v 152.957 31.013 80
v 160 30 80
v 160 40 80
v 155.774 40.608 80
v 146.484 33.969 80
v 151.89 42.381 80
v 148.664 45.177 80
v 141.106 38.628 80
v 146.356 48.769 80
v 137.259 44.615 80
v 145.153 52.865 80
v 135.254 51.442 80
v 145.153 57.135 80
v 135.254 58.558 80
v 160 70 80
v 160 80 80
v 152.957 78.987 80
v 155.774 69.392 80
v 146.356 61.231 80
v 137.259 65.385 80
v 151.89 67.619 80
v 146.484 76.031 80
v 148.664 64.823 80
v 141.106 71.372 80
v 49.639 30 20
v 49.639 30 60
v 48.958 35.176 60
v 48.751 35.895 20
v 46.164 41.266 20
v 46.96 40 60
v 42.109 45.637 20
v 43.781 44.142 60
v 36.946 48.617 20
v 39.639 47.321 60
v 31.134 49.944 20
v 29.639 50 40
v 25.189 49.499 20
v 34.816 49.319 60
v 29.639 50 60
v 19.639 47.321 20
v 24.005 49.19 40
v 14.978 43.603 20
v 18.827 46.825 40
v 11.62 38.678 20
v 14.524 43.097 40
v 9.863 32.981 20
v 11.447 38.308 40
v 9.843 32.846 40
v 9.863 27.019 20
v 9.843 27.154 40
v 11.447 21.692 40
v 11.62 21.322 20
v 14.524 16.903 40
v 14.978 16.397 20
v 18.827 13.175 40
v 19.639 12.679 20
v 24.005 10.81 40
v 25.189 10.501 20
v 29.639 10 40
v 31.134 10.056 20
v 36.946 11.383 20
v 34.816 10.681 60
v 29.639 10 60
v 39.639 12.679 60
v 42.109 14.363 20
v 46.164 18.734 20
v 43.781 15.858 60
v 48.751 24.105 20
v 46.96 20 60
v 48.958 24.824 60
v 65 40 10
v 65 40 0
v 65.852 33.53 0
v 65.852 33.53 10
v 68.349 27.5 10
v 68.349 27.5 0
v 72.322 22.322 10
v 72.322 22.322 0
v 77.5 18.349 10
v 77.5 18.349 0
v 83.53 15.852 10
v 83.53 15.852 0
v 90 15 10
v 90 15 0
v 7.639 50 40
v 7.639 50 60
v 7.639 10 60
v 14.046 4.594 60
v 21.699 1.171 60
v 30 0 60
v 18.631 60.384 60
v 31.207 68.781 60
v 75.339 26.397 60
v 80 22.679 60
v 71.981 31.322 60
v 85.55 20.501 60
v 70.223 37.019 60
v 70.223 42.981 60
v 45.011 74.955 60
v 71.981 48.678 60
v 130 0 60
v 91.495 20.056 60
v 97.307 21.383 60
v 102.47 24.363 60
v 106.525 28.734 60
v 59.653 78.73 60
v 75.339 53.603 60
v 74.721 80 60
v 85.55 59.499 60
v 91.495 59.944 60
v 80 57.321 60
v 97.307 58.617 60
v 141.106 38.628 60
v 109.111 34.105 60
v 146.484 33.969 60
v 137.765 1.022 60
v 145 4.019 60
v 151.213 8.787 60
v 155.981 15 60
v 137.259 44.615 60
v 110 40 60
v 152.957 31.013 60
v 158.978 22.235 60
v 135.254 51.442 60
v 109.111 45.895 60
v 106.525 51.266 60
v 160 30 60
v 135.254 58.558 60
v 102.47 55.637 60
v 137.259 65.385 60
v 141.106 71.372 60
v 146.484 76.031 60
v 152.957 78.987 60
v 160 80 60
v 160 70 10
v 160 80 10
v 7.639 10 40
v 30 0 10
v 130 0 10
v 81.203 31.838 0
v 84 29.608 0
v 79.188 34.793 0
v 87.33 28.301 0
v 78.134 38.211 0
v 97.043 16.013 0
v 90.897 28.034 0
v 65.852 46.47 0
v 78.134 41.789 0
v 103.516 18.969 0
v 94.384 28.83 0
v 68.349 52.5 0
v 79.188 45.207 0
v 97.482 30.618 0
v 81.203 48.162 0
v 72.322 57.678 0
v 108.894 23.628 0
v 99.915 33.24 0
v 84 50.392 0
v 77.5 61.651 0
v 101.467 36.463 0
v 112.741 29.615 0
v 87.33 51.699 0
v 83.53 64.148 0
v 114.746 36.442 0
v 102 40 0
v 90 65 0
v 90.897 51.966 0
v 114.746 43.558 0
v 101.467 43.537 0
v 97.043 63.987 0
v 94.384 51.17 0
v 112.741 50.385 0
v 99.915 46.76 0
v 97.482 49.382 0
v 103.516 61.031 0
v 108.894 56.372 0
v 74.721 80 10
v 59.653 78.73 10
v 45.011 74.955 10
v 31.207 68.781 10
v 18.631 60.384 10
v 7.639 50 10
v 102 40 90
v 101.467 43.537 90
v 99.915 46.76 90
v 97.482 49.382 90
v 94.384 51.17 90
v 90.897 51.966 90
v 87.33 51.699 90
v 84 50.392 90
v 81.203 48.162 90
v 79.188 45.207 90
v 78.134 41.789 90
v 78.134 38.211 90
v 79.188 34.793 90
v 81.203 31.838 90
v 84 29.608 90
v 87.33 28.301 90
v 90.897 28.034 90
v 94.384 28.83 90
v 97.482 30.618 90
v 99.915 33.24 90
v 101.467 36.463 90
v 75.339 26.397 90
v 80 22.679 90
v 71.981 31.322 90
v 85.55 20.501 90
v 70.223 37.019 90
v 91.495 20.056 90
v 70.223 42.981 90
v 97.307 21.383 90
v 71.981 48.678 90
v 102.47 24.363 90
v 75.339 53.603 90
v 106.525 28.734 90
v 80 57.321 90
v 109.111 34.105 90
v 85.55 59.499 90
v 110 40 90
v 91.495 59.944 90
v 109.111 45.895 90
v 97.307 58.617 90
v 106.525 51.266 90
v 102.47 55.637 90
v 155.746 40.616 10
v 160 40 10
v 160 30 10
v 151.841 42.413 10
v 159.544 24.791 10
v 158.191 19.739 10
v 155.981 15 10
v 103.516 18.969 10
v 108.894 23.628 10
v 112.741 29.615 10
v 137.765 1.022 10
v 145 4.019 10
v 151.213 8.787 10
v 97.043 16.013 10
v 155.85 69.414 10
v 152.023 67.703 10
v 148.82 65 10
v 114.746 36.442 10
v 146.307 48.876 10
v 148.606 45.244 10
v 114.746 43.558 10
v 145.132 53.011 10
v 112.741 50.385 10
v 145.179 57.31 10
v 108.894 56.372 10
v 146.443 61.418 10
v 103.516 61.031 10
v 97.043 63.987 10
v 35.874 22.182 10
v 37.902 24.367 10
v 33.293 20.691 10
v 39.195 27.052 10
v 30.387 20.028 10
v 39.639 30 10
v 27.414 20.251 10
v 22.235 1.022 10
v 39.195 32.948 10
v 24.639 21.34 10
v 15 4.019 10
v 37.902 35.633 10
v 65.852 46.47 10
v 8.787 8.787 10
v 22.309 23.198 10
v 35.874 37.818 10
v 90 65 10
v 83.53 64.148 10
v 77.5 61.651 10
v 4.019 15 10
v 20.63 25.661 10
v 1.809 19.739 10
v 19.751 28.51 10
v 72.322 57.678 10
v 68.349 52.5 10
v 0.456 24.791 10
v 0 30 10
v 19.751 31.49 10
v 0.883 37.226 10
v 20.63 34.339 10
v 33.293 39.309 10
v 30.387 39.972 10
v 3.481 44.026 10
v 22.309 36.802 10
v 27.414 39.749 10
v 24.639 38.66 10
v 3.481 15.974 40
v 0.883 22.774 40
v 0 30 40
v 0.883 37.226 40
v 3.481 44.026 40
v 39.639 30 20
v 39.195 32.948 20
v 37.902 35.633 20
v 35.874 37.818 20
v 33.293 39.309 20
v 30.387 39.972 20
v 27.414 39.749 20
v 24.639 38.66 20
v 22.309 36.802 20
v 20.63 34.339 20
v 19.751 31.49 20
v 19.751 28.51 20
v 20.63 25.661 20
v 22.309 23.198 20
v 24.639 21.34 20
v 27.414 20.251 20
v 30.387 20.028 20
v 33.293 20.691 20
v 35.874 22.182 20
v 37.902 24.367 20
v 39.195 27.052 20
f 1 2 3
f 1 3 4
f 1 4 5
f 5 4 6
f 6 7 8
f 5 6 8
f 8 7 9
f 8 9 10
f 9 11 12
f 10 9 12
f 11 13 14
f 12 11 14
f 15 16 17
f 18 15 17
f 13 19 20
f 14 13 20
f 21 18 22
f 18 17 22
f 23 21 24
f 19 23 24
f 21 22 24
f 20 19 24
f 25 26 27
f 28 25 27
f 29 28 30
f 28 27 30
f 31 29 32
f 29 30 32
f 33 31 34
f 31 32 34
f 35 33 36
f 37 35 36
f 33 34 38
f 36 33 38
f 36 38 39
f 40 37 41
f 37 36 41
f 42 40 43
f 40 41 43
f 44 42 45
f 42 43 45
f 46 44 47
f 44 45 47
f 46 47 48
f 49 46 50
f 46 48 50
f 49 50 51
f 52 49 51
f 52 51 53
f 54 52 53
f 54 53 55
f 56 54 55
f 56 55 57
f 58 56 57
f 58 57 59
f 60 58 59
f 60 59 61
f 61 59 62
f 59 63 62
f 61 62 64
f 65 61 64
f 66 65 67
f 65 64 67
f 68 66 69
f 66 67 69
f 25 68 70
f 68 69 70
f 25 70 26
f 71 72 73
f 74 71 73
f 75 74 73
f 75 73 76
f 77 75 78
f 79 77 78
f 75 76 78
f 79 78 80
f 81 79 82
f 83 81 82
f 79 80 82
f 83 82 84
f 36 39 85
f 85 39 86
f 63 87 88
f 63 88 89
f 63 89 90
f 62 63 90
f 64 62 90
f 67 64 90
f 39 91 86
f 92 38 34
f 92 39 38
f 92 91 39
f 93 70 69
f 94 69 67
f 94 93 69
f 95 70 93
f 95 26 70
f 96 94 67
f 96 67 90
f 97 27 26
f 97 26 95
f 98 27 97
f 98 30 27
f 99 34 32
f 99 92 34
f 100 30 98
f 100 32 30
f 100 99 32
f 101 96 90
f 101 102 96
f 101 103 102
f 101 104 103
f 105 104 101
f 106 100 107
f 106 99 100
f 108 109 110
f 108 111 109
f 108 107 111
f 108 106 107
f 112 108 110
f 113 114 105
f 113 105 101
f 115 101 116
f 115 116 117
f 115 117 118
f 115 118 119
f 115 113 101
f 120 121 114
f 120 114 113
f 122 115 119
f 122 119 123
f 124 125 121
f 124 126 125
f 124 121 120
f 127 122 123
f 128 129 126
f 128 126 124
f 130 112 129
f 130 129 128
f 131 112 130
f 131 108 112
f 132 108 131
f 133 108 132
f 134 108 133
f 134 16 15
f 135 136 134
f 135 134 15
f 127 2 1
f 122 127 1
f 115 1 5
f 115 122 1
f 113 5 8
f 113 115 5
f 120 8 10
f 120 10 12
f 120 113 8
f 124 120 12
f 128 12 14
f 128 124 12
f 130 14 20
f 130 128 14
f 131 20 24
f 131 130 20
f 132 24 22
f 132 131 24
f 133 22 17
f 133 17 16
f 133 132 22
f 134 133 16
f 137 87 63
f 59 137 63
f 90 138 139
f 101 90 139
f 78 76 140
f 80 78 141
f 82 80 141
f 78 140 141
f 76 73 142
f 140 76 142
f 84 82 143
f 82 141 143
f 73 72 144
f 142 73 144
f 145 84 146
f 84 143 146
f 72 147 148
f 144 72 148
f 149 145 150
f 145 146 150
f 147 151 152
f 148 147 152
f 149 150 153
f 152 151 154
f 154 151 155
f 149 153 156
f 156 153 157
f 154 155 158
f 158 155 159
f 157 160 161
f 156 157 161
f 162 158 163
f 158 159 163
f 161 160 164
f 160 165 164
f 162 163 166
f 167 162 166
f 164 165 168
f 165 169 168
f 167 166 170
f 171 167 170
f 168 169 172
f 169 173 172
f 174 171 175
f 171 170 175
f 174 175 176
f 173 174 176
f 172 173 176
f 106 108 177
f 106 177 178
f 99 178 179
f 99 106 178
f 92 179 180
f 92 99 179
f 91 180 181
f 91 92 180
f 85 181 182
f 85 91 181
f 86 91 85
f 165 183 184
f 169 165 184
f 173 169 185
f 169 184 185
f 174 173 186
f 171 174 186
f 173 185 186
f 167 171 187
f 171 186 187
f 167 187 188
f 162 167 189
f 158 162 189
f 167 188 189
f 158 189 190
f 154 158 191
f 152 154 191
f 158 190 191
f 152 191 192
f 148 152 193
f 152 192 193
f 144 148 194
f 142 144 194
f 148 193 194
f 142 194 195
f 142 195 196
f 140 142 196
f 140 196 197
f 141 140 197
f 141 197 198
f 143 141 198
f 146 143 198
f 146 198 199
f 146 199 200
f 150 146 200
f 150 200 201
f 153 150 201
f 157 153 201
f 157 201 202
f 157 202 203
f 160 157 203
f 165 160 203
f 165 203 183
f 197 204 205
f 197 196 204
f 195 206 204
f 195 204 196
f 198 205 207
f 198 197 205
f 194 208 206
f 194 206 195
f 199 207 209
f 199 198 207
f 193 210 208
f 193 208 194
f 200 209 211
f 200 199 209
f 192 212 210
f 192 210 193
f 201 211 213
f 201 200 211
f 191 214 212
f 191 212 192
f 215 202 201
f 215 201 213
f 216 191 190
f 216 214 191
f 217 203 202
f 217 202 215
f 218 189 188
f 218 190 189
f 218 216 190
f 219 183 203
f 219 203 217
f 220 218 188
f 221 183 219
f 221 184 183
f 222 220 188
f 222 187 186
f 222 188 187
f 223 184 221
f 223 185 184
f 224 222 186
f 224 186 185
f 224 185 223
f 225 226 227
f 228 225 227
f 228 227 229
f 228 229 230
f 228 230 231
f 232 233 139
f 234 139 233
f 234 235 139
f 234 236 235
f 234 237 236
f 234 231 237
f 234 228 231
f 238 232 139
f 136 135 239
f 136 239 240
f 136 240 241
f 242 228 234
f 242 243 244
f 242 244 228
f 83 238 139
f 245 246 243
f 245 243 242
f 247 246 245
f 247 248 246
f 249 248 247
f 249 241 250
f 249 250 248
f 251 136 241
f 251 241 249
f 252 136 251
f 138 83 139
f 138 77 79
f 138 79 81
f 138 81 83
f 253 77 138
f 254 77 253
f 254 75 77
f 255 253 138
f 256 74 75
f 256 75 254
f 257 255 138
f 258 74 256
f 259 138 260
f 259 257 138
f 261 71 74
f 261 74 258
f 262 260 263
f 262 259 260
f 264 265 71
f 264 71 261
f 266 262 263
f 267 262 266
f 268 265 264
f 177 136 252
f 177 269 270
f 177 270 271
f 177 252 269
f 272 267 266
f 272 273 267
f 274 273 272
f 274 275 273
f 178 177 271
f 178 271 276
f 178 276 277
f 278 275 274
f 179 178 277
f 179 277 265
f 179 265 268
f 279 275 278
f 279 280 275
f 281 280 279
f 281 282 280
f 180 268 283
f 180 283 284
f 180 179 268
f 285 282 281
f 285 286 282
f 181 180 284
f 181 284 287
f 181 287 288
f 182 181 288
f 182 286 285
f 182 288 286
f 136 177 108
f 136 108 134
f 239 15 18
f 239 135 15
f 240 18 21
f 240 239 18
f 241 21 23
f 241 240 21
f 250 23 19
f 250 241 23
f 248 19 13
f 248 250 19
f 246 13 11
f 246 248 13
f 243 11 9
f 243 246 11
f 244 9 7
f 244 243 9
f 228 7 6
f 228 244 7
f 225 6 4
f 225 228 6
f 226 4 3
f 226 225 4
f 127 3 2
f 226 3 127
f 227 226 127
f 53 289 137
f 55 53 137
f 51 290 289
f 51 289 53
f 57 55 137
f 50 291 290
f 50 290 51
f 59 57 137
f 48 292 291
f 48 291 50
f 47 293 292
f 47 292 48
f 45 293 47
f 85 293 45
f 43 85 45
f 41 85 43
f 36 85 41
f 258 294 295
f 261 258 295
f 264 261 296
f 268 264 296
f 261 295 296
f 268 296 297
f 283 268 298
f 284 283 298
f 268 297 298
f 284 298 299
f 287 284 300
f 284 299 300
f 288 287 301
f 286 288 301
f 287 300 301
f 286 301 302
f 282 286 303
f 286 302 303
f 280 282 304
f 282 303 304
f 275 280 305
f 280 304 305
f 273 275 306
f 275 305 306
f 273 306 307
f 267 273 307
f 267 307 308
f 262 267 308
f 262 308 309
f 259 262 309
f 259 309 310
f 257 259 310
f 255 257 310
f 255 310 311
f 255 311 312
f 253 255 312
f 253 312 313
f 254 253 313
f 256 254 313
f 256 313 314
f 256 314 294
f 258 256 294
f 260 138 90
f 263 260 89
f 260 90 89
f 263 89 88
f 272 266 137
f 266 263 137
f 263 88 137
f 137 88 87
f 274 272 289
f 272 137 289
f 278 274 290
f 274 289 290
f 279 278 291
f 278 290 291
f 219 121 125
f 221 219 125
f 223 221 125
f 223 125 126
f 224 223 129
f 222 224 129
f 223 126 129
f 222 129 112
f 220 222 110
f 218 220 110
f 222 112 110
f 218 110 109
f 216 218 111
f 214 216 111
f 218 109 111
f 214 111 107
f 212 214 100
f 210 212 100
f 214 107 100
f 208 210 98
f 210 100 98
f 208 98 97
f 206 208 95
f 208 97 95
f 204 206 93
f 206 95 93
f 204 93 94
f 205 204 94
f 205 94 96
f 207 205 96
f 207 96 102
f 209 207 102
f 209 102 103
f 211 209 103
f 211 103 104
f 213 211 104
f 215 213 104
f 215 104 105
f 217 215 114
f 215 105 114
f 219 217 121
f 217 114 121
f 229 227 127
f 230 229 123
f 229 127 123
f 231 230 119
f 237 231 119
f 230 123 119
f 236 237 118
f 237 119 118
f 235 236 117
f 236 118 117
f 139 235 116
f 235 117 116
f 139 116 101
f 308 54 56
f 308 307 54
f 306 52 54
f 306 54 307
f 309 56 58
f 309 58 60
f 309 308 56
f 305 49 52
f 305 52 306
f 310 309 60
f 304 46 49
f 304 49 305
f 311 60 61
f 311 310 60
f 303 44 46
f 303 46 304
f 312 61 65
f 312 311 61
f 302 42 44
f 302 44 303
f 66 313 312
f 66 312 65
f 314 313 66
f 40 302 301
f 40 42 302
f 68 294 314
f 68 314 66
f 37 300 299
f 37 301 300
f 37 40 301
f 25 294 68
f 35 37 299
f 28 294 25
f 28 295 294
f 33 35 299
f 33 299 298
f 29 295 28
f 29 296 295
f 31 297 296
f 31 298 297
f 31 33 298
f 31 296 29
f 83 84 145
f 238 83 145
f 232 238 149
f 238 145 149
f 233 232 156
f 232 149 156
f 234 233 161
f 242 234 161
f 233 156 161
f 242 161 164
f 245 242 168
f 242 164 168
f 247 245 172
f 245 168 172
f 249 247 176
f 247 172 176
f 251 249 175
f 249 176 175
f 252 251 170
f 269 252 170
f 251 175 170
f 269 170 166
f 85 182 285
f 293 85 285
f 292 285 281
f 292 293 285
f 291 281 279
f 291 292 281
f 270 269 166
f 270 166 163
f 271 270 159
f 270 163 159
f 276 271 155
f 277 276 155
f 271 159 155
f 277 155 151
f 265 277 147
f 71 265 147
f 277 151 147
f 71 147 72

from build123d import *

# Parameters (mm, degrees)
SKETCH1_W           = 160
SKETCH1_H           = 80
BOSS_EXTRUDE1_DEPTH = 90
CUT_EXTRUDE1_DEPTH  = 90
CUT_EXTRUDE2_DEPTH  = 90
SKETCH4_W           = 10
SKETCH4_H           = 15
CUT_EXTRUDE3_DEPTH  = 215
CUT_EXTRUDE4_DEPTH  = 10
CUT_EXTRUDE6_DEPTH  = 263
SKETCH7_W           = 160
SKETCH7_H           = 80
CUT_EXTRUDE7_DEPTH  = 263
SKETCH8_R           = 20
BOSS_EXTRUDE2_DEPTH = 30
SKETCH9_R           = 11
CUT_EXTRUDE8_DEPTH  = 117
BOSS_EXTRUDE3_DEPTH = 20
CUT_EXTRUDE9_DEPTH  = 20
SKETCH12_R          = 20
CUT_EXTRUDE10_DEPTH = 40
SKETCH13_R          = 10
CUT_EXTRUDE11_DEPTH = 40
SKETCH14_R          = 12
CUT_EXTRUDE12_DEPTH = 114


with BuildPart() as part:
    # Sketch1 → Boss-Extrude1 (new body)
    with BuildSketch(Plane.XY):
        with Locations((80, 40)):
            Rectangle(SKETCH1_W, SKETCH1_H)
    extrude(amount=BOSS_EXTRUDE1_DEPTH)

    # Sketch2 → Cut-Extrude1 (cut)
    with BuildSketch(Plane.XY.offset(90)):
        with BuildLine():
            ThreePointArc((160, 70), (145, 55), (160, 40))
            Line((160, 40), (160, 70))
        make_face()
        with BuildLine():
            ThreePointArc((160, 30), (151.213203436, 8.786796564), (130, 0))
            Line((130, 0), (160, 0))
            Line((160, 0), (160, 30))
        make_face()
    extrude(amount=-CUT_EXTRUDE1_DEPTH, mode=Mode.SUBTRACT)

    # Sketch3 → Cut-Extrude2 (cut)
    with BuildSketch(Plane.XY.offset(90)):
        with BuildLine():
            Line((0, 30), (0, 0))
            Line((0, 0), (30, 0))
            ThreePointArc((30, 0), (8.786796564, 8.786796564), (0, 30))
        make_face()
    extrude(amount=-CUT_EXTRUDE2_DEPTH, mode=Mode.SUBTRACT)

    # Sketch4 → Cut-Extrude3 (cut)
    with BuildSketch(Plane.ZY):
        with Locations((5, 72.5)):
            Rectangle(SKETCH4_W, SKETCH4_H)
        with Locations((5, 7.5)):
            Rectangle(SKETCH4_W, SKETCH4_H)
    extrude(amount=-CUT_EXTRUDE3_DEPTH, mode=Mode.SUBTRACT)

    # Sketch5 → Cut-Extrude4 (cut)
    with BuildSketch(Plane(origin=(0, 0, 0), x_dir=(-1, 0, 0), z_dir=(0, 0, -1))):
        with BuildLine():
            ThreePointArc((-90, 15), (-115, 40), (-90, 65))
            Line((-90, 65), (-148.819660113, 65))
            ThreePointArc((-148.819660113, 65), (-146.306936062, 48.876275643), (-160, 40))
            Line((-160, 40), (-160, 30))
            ThreePointArc((-160, 30), (-158.977774789, 22.235428647), (-155.980762114, 15))
            Line((-155.980762114, 15), (-90, 15))
        make_face()
        with BuildLine():
            Line((0, 65), (-90, 65))
            ThreePointArc((-90, 65), (-72.32233047, 57.67766953), (-65, 40))
            ThreePointArc((-65, 40), (-72.32233047, 22.32233047), (-90, 15))
            Line((-90, 15), (-4.019237886, 15))
            ThreePointArc((-4.019237886, 15), (-1.022225211, 22.235428647), (0, 30))
            Line((0, 30), (0, 65))
        make_face()
    extrude(amount=-CUT_EXTRUDE4_DEPTH, mode=Mode.SUBTRACT)

    # Sketch6 → Cut-Extrude6 (cut)
    with BuildSketch(Plane.XY.offset(90)):
        with BuildLine():
            Line((0, 30), (0, 80))
            Line((0, 80), (74.72135955, 80))
            ThreePointArc((74.72135955, 80), (37.979013408, 72.158383626), (7.639320225, 50))
            ThreePointArc((7.639320225, 50), (1.974829231, 40.704662693), (0, 30))
        make_face()
    extrude(amount=-CUT_EXTRUDE6_DEPTH, mode=Mode.SUBTRACT)

    # Sketch7 → Cut-Extrude7 (cut)
    with BuildSketch(Plane.XY.offset(60)):
        with Locations((80, 40)):
            Rectangle(SKETCH7_W, SKETCH7_H)
    extrude(amount=CUT_EXTRUDE7_DEPTH, mode=Mode.SUBTRACT)

    # Sketch8 → Boss-Extrude2 (add)
    with BuildSketch(Plane.XY.offset(60)):
        with Locations((90, 40)):
            Circle(SKETCH8_R)
    extrude(amount=BOSS_EXTRUDE2_DEPTH)

    # Sketch9 → Cut-Extrude8 (cut)
    with BuildSketch(Plane.XY.offset(90)):
        with Locations((90, 40)):
            Circle(SKETCH9_R)
    extrude(amount=-CUT_EXTRUDE8_DEPTH, mode=Mode.SUBTRACT)

    # Sketch10 → Boss-Extrude3 (add)
    with BuildSketch(Plane.XY.offset(60)):
        with BuildLine():
            Line((160, 40), (160, 30))
            ThreePointArc((160, 30), (135, 55), (160, 80))
            Line((160, 80), (160, 70))
            ThreePointArc((160, 70), (145, 55), (160, 40))
        make_face()
    extrude(amount=BOSS_EXTRUDE3_DEPTH)

    # Sketch11 → Cut-Extrude9 (cut)
    with BuildSketch(Plane.XY.offset(60)):
        with BuildLine():
            ThreePointArc((29.639320225, 10), (9.639320225, 30), (29.639320225, 50))
            Line((29.639320225, 50), (7.639320225, 50))
            ThreePointArc((7.639320225, 50), (0, 30), (7.639320225, 10))
            Line((7.639320225, 10), (29.639320225, 10))
        make_face()
    extrude(amount=-CUT_EXTRUDE9_DEPTH, mode=Mode.SUBTRACT)

    # Sketch12 → Cut-Extrude10 (cut)
    with BuildSketch(Plane.XY.offset(60)):
        with Locations((29.639320225, 30)):
            Circle(SKETCH12_R)
    extrude(amount=-CUT_EXTRUDE10_DEPTH, mode=Mode.SUBTRACT)

    # Sketch13 → Cut-Extrude11 (cut)
    with BuildSketch(Plane.XY.offset(20)):
        with Locations((29.639320225, 30)):
            Circle(SKETCH13_R)
    extrude(amount=-CUT_EXTRUDE11_DEPTH, mode=Mode.SUBTRACT)

    # Sketch14 → Cut-Extrude12 (cut)
    with BuildSketch(Plane.XY.offset(90)):
        with Locations((90, 40)):
            Circle(SKETCH14_R)
    extrude(amount=-CUT_EXTRUDE12_DEPTH, mode=Mode.SUBTRACT)


solid = part.part
